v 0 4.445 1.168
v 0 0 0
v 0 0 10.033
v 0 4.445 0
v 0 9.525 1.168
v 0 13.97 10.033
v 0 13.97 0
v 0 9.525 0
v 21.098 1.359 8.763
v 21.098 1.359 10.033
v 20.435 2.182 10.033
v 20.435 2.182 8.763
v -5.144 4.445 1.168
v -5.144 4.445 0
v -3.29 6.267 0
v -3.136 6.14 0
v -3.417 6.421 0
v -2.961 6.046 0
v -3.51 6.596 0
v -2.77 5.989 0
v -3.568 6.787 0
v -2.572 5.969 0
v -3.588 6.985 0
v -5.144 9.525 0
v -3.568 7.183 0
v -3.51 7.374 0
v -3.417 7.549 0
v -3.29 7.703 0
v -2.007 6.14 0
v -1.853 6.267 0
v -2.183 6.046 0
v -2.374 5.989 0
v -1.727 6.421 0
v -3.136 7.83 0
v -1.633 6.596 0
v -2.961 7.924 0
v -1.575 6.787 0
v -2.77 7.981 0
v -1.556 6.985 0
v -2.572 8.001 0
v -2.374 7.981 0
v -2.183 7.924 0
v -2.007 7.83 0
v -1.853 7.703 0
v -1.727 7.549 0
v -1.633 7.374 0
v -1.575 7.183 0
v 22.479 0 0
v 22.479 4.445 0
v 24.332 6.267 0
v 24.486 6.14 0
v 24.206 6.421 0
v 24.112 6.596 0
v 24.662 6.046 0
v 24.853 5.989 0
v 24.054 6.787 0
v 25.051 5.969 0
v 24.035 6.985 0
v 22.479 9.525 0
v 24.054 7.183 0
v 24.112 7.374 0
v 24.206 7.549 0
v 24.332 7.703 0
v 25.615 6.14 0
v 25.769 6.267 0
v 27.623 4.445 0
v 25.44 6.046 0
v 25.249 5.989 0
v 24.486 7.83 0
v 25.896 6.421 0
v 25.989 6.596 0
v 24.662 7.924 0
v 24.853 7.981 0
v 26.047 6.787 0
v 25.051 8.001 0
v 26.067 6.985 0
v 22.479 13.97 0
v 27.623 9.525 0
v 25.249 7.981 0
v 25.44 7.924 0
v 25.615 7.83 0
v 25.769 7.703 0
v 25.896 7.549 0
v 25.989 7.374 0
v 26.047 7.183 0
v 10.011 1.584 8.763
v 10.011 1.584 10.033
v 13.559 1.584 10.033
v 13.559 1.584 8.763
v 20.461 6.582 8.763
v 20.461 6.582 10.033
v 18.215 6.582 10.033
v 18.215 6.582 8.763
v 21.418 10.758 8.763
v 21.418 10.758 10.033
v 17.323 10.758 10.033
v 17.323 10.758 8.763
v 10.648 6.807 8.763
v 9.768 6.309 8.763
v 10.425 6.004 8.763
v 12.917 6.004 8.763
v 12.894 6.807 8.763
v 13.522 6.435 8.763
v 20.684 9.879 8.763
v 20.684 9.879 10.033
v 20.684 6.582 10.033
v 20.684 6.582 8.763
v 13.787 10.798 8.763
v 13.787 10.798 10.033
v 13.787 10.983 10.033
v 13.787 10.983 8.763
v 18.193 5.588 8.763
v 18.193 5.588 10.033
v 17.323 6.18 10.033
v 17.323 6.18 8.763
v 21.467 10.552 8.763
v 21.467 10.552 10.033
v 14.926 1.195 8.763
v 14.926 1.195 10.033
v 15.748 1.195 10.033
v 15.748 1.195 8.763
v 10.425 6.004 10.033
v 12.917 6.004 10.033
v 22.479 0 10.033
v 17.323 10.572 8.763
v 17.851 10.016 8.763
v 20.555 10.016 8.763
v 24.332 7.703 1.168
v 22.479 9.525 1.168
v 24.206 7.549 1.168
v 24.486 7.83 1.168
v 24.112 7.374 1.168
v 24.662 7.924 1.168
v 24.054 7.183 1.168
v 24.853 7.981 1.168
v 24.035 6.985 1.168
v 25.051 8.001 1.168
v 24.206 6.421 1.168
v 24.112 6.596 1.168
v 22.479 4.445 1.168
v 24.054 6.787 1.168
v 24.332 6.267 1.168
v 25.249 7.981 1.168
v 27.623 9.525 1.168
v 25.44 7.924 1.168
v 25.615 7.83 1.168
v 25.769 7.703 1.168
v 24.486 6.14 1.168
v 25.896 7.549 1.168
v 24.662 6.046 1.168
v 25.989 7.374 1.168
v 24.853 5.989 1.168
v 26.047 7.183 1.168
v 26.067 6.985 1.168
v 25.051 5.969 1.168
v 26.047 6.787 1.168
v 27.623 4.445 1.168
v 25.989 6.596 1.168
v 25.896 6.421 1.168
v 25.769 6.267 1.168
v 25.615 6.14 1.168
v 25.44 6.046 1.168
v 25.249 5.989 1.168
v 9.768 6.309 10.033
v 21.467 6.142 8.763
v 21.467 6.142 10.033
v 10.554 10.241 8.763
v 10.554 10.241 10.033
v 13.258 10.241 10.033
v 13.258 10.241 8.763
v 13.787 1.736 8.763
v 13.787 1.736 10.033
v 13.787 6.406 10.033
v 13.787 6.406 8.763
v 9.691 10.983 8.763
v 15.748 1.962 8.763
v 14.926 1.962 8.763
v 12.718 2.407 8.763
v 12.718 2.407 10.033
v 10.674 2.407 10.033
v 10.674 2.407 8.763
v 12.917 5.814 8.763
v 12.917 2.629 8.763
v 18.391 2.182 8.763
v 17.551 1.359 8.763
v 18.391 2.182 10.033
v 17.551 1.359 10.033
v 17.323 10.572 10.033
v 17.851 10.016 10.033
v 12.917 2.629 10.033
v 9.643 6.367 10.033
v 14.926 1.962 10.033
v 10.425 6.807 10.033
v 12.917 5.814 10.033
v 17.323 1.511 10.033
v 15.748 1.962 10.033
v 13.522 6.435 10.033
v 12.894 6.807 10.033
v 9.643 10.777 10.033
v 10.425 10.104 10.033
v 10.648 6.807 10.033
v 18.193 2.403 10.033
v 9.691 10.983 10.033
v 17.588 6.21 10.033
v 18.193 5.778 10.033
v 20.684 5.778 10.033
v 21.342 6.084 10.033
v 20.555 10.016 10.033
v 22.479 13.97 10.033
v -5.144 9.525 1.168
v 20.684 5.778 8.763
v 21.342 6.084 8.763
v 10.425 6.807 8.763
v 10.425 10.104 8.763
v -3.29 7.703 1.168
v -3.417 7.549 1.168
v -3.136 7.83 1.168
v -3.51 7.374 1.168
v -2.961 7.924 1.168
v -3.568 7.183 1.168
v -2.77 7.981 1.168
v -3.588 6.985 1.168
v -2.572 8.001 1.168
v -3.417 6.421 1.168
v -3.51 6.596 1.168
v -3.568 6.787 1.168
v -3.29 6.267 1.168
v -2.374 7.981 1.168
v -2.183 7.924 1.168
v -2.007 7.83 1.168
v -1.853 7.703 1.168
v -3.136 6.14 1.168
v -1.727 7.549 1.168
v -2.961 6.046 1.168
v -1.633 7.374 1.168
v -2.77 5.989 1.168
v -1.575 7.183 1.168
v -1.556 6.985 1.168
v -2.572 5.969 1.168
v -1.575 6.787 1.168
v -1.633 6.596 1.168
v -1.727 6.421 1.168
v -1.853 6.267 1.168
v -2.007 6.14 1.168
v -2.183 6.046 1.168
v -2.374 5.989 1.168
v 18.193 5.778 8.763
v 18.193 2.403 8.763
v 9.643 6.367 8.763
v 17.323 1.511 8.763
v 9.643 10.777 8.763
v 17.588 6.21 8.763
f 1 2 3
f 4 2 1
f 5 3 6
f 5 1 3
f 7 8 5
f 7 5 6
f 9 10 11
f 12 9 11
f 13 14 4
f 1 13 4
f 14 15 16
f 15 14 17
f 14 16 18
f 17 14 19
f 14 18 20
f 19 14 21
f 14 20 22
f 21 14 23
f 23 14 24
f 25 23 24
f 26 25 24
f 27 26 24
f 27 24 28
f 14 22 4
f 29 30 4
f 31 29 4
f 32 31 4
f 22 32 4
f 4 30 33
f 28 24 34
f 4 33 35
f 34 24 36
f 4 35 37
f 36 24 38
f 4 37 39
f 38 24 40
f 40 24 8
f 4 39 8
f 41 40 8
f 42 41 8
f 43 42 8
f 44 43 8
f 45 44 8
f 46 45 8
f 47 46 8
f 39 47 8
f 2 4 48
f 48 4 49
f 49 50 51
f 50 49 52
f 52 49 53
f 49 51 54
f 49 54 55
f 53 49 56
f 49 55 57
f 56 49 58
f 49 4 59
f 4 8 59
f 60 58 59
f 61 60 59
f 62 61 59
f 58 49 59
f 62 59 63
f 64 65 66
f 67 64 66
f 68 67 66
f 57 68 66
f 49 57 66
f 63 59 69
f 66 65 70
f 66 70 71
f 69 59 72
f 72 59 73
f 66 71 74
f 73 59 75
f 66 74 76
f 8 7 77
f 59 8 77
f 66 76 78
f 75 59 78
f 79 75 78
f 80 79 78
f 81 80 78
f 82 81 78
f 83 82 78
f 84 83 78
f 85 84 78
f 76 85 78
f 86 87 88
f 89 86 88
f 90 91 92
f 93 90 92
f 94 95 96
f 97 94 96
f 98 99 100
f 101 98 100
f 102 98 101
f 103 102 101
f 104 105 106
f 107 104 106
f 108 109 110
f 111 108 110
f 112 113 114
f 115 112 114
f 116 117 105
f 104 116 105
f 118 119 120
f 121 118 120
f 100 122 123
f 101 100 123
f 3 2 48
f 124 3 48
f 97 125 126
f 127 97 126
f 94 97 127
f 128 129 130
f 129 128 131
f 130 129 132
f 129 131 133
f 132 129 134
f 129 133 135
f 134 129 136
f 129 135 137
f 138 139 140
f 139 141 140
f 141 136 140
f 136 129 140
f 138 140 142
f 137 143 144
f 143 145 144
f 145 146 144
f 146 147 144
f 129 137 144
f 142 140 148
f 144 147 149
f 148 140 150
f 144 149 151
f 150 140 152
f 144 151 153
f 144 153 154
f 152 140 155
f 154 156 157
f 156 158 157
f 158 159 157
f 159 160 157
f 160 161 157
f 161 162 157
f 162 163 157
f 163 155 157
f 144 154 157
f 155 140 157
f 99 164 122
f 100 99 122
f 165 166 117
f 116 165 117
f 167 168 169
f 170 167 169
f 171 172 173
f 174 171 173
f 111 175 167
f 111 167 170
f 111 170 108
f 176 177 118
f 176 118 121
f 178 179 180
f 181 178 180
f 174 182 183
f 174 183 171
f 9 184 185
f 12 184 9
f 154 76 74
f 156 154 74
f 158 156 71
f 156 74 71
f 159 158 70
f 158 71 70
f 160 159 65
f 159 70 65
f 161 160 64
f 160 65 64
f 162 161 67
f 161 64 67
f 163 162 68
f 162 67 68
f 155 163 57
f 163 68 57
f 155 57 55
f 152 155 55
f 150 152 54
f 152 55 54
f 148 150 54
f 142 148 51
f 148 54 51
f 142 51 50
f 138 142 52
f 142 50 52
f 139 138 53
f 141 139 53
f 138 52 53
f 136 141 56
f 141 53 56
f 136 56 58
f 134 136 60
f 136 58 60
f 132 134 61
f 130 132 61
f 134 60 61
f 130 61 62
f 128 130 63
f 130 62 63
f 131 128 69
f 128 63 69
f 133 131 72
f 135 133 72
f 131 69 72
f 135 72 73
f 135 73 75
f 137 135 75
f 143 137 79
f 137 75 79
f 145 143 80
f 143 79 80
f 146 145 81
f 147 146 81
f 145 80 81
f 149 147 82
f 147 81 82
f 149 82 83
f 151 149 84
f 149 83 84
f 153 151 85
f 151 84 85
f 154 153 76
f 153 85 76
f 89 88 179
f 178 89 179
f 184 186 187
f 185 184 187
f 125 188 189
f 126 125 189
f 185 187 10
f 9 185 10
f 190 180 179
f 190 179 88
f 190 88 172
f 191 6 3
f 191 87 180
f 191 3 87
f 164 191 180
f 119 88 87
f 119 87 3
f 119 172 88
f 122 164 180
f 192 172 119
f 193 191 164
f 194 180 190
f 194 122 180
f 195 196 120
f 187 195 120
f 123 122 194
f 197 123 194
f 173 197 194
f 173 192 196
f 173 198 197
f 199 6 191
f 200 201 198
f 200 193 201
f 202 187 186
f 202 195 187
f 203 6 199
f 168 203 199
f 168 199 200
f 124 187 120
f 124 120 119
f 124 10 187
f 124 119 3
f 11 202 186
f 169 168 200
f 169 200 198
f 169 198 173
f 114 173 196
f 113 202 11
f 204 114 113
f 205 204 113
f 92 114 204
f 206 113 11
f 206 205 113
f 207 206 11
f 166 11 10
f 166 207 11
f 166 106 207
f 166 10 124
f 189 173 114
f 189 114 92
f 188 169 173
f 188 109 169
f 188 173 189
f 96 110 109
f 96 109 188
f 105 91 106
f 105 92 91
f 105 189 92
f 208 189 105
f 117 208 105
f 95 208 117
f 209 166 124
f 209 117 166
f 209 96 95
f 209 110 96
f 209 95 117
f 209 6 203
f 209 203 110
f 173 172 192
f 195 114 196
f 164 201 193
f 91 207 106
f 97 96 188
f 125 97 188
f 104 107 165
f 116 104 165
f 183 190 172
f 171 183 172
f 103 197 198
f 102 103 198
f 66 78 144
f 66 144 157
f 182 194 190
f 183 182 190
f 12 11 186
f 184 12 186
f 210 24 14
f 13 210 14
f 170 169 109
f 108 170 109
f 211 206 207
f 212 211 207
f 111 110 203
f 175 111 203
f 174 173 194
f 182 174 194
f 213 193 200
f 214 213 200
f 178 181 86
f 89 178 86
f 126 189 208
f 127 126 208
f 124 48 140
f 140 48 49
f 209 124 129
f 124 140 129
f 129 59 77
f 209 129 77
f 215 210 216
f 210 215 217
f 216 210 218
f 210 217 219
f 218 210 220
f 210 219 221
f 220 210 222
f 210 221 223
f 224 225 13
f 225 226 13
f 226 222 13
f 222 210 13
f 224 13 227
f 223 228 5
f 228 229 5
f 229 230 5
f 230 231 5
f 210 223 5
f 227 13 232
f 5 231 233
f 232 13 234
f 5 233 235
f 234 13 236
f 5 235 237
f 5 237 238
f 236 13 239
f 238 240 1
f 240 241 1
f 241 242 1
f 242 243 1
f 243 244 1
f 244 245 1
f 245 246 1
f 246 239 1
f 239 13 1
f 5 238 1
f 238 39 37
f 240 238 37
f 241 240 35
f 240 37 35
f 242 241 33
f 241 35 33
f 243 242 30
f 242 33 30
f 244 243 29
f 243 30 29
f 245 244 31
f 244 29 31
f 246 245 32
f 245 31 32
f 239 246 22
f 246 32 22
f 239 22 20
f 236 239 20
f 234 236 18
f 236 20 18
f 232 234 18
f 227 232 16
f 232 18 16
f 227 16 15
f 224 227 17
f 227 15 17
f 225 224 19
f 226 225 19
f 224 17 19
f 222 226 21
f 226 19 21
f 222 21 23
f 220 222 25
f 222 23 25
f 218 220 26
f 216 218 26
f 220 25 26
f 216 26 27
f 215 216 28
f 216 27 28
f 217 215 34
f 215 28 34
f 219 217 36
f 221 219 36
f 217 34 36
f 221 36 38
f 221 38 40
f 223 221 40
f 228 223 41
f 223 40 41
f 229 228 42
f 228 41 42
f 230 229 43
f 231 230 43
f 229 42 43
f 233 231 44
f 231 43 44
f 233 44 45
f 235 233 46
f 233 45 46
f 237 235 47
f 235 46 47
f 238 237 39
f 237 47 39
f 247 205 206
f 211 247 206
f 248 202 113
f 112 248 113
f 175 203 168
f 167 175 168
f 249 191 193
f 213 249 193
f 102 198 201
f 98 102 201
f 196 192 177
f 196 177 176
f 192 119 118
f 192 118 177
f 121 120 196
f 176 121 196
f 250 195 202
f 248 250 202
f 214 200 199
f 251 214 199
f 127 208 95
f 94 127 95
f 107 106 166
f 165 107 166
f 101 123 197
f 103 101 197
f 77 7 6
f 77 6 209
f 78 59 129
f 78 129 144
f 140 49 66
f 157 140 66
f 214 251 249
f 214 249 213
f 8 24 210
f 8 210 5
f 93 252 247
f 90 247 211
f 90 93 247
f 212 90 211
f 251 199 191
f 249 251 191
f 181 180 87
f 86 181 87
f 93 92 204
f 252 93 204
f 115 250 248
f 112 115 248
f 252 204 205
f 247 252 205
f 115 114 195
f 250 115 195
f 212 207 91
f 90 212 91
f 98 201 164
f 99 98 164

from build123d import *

# Parameters (mm, degrees)
F0_W     = 22.479
F0_H     = 13.97
F1_DEPTH = 10.033
F2_W     = 5.1435
F2_H     = 5.08
F2_R     = 1.016
F3_DEPTH = 1.1684
F4_W     = 0.82242
F4_H     = 0.767591
F5_DEPTH = 1.27


with BuildPart() as f1:
    # F0 (on Top) → F1 (new body)
    with BuildSketch(Plane.XY):
        with Locations((11.2395, 6.985)):
            Rectangle(F0_W, F0_H)
    extrude(amount=F1_DEPTH)

    # F2 (on face) → F3 (join)
    with BuildSketch(Plane(origin=(0, 0, 0), x_dir=(1, 0, 0), z_dir=(0, 0, -1))):
        with Locations((-2.57175, -6.985)):
            Rectangle(F2_W, F2_H)
        with Locations((-2.57175, -6.985)):
            Circle(F2_R, mode=Mode.SUBTRACT)
        with Locations((25.05075, -6.985)):
            Rectangle(F2_W, F2_H)
        with Locations((25.05075, -6.985)):
            Circle(F2_R, mode=Mode.SUBTRACT)
    extrude(amount=-F3_DEPTH)

    # F4 (on face) → F5 (cut)
    with BuildSketch(Plane.XY.offset(10.033)):
        Polygon((13.786751, 10.79755), (13.786751, 10.982947), (9.691444, 10.982947), (10.554357, 10.241496), (13.258331, 10.241496), align=None)
        Polygon((10.425497, 10.104383), (9.64253, 10.777142), (9.64253, 6.367391), (10.425497, 6.807481), align=None)
        Polygon((9.767849, 6.309171), (10.425497, 6.003647), (12.916651, 6.003647), (13.521753, 6.435402), (12.894051, 6.807481), (10.648357, 6.807481), align=None)
        Polygon((13.786751, 1.735938), (13.786751, 6.003647), (13.786751, 6.405564), (12.916651, 5.813658), (12.916651, 2.628638), align=None)
        Polygon((10.011367, 1.583957), (13.558927, 1.583957), (12.718385, 2.407485), (10.674233, 2.407485), align=None)
        with Locations((15.336972, 1.578371)):
            Rectangle(F4_W, F4_H)
        Polygon((20.461116, 6.582137), (18.215422, 6.582137), (17.587719, 6.210058), (18.192822, 5.778302), (20.683976, 5.778302), (21.341624, 6.083827), align=None)
        Polygon((17.322722, 10.572206), (17.851142, 10.016152), (20.555116, 10.016152), (21.418029, 10.757603), (17.322722, 10.757603), align=None)
        Polygon((20.683976, 9.879039), (20.683976, 6.582137), (21.466942, 6.142047), (21.466942, 10.551798), align=None)
        Polygon((17.322722, 1.510594), (18.192822, 2.403293), (18.192822, 5.588314), (17.322722, 6.18022), align=None)
        Polygon((21.098106, 1.358613), (20.43524, 2.182141), (18.391088, 2.182141), (17.550545, 1.358613), align=None)
    extrude(amount=-F5_DEPTH, mode=Mode.SUBTRACT)


solid = f1.part
